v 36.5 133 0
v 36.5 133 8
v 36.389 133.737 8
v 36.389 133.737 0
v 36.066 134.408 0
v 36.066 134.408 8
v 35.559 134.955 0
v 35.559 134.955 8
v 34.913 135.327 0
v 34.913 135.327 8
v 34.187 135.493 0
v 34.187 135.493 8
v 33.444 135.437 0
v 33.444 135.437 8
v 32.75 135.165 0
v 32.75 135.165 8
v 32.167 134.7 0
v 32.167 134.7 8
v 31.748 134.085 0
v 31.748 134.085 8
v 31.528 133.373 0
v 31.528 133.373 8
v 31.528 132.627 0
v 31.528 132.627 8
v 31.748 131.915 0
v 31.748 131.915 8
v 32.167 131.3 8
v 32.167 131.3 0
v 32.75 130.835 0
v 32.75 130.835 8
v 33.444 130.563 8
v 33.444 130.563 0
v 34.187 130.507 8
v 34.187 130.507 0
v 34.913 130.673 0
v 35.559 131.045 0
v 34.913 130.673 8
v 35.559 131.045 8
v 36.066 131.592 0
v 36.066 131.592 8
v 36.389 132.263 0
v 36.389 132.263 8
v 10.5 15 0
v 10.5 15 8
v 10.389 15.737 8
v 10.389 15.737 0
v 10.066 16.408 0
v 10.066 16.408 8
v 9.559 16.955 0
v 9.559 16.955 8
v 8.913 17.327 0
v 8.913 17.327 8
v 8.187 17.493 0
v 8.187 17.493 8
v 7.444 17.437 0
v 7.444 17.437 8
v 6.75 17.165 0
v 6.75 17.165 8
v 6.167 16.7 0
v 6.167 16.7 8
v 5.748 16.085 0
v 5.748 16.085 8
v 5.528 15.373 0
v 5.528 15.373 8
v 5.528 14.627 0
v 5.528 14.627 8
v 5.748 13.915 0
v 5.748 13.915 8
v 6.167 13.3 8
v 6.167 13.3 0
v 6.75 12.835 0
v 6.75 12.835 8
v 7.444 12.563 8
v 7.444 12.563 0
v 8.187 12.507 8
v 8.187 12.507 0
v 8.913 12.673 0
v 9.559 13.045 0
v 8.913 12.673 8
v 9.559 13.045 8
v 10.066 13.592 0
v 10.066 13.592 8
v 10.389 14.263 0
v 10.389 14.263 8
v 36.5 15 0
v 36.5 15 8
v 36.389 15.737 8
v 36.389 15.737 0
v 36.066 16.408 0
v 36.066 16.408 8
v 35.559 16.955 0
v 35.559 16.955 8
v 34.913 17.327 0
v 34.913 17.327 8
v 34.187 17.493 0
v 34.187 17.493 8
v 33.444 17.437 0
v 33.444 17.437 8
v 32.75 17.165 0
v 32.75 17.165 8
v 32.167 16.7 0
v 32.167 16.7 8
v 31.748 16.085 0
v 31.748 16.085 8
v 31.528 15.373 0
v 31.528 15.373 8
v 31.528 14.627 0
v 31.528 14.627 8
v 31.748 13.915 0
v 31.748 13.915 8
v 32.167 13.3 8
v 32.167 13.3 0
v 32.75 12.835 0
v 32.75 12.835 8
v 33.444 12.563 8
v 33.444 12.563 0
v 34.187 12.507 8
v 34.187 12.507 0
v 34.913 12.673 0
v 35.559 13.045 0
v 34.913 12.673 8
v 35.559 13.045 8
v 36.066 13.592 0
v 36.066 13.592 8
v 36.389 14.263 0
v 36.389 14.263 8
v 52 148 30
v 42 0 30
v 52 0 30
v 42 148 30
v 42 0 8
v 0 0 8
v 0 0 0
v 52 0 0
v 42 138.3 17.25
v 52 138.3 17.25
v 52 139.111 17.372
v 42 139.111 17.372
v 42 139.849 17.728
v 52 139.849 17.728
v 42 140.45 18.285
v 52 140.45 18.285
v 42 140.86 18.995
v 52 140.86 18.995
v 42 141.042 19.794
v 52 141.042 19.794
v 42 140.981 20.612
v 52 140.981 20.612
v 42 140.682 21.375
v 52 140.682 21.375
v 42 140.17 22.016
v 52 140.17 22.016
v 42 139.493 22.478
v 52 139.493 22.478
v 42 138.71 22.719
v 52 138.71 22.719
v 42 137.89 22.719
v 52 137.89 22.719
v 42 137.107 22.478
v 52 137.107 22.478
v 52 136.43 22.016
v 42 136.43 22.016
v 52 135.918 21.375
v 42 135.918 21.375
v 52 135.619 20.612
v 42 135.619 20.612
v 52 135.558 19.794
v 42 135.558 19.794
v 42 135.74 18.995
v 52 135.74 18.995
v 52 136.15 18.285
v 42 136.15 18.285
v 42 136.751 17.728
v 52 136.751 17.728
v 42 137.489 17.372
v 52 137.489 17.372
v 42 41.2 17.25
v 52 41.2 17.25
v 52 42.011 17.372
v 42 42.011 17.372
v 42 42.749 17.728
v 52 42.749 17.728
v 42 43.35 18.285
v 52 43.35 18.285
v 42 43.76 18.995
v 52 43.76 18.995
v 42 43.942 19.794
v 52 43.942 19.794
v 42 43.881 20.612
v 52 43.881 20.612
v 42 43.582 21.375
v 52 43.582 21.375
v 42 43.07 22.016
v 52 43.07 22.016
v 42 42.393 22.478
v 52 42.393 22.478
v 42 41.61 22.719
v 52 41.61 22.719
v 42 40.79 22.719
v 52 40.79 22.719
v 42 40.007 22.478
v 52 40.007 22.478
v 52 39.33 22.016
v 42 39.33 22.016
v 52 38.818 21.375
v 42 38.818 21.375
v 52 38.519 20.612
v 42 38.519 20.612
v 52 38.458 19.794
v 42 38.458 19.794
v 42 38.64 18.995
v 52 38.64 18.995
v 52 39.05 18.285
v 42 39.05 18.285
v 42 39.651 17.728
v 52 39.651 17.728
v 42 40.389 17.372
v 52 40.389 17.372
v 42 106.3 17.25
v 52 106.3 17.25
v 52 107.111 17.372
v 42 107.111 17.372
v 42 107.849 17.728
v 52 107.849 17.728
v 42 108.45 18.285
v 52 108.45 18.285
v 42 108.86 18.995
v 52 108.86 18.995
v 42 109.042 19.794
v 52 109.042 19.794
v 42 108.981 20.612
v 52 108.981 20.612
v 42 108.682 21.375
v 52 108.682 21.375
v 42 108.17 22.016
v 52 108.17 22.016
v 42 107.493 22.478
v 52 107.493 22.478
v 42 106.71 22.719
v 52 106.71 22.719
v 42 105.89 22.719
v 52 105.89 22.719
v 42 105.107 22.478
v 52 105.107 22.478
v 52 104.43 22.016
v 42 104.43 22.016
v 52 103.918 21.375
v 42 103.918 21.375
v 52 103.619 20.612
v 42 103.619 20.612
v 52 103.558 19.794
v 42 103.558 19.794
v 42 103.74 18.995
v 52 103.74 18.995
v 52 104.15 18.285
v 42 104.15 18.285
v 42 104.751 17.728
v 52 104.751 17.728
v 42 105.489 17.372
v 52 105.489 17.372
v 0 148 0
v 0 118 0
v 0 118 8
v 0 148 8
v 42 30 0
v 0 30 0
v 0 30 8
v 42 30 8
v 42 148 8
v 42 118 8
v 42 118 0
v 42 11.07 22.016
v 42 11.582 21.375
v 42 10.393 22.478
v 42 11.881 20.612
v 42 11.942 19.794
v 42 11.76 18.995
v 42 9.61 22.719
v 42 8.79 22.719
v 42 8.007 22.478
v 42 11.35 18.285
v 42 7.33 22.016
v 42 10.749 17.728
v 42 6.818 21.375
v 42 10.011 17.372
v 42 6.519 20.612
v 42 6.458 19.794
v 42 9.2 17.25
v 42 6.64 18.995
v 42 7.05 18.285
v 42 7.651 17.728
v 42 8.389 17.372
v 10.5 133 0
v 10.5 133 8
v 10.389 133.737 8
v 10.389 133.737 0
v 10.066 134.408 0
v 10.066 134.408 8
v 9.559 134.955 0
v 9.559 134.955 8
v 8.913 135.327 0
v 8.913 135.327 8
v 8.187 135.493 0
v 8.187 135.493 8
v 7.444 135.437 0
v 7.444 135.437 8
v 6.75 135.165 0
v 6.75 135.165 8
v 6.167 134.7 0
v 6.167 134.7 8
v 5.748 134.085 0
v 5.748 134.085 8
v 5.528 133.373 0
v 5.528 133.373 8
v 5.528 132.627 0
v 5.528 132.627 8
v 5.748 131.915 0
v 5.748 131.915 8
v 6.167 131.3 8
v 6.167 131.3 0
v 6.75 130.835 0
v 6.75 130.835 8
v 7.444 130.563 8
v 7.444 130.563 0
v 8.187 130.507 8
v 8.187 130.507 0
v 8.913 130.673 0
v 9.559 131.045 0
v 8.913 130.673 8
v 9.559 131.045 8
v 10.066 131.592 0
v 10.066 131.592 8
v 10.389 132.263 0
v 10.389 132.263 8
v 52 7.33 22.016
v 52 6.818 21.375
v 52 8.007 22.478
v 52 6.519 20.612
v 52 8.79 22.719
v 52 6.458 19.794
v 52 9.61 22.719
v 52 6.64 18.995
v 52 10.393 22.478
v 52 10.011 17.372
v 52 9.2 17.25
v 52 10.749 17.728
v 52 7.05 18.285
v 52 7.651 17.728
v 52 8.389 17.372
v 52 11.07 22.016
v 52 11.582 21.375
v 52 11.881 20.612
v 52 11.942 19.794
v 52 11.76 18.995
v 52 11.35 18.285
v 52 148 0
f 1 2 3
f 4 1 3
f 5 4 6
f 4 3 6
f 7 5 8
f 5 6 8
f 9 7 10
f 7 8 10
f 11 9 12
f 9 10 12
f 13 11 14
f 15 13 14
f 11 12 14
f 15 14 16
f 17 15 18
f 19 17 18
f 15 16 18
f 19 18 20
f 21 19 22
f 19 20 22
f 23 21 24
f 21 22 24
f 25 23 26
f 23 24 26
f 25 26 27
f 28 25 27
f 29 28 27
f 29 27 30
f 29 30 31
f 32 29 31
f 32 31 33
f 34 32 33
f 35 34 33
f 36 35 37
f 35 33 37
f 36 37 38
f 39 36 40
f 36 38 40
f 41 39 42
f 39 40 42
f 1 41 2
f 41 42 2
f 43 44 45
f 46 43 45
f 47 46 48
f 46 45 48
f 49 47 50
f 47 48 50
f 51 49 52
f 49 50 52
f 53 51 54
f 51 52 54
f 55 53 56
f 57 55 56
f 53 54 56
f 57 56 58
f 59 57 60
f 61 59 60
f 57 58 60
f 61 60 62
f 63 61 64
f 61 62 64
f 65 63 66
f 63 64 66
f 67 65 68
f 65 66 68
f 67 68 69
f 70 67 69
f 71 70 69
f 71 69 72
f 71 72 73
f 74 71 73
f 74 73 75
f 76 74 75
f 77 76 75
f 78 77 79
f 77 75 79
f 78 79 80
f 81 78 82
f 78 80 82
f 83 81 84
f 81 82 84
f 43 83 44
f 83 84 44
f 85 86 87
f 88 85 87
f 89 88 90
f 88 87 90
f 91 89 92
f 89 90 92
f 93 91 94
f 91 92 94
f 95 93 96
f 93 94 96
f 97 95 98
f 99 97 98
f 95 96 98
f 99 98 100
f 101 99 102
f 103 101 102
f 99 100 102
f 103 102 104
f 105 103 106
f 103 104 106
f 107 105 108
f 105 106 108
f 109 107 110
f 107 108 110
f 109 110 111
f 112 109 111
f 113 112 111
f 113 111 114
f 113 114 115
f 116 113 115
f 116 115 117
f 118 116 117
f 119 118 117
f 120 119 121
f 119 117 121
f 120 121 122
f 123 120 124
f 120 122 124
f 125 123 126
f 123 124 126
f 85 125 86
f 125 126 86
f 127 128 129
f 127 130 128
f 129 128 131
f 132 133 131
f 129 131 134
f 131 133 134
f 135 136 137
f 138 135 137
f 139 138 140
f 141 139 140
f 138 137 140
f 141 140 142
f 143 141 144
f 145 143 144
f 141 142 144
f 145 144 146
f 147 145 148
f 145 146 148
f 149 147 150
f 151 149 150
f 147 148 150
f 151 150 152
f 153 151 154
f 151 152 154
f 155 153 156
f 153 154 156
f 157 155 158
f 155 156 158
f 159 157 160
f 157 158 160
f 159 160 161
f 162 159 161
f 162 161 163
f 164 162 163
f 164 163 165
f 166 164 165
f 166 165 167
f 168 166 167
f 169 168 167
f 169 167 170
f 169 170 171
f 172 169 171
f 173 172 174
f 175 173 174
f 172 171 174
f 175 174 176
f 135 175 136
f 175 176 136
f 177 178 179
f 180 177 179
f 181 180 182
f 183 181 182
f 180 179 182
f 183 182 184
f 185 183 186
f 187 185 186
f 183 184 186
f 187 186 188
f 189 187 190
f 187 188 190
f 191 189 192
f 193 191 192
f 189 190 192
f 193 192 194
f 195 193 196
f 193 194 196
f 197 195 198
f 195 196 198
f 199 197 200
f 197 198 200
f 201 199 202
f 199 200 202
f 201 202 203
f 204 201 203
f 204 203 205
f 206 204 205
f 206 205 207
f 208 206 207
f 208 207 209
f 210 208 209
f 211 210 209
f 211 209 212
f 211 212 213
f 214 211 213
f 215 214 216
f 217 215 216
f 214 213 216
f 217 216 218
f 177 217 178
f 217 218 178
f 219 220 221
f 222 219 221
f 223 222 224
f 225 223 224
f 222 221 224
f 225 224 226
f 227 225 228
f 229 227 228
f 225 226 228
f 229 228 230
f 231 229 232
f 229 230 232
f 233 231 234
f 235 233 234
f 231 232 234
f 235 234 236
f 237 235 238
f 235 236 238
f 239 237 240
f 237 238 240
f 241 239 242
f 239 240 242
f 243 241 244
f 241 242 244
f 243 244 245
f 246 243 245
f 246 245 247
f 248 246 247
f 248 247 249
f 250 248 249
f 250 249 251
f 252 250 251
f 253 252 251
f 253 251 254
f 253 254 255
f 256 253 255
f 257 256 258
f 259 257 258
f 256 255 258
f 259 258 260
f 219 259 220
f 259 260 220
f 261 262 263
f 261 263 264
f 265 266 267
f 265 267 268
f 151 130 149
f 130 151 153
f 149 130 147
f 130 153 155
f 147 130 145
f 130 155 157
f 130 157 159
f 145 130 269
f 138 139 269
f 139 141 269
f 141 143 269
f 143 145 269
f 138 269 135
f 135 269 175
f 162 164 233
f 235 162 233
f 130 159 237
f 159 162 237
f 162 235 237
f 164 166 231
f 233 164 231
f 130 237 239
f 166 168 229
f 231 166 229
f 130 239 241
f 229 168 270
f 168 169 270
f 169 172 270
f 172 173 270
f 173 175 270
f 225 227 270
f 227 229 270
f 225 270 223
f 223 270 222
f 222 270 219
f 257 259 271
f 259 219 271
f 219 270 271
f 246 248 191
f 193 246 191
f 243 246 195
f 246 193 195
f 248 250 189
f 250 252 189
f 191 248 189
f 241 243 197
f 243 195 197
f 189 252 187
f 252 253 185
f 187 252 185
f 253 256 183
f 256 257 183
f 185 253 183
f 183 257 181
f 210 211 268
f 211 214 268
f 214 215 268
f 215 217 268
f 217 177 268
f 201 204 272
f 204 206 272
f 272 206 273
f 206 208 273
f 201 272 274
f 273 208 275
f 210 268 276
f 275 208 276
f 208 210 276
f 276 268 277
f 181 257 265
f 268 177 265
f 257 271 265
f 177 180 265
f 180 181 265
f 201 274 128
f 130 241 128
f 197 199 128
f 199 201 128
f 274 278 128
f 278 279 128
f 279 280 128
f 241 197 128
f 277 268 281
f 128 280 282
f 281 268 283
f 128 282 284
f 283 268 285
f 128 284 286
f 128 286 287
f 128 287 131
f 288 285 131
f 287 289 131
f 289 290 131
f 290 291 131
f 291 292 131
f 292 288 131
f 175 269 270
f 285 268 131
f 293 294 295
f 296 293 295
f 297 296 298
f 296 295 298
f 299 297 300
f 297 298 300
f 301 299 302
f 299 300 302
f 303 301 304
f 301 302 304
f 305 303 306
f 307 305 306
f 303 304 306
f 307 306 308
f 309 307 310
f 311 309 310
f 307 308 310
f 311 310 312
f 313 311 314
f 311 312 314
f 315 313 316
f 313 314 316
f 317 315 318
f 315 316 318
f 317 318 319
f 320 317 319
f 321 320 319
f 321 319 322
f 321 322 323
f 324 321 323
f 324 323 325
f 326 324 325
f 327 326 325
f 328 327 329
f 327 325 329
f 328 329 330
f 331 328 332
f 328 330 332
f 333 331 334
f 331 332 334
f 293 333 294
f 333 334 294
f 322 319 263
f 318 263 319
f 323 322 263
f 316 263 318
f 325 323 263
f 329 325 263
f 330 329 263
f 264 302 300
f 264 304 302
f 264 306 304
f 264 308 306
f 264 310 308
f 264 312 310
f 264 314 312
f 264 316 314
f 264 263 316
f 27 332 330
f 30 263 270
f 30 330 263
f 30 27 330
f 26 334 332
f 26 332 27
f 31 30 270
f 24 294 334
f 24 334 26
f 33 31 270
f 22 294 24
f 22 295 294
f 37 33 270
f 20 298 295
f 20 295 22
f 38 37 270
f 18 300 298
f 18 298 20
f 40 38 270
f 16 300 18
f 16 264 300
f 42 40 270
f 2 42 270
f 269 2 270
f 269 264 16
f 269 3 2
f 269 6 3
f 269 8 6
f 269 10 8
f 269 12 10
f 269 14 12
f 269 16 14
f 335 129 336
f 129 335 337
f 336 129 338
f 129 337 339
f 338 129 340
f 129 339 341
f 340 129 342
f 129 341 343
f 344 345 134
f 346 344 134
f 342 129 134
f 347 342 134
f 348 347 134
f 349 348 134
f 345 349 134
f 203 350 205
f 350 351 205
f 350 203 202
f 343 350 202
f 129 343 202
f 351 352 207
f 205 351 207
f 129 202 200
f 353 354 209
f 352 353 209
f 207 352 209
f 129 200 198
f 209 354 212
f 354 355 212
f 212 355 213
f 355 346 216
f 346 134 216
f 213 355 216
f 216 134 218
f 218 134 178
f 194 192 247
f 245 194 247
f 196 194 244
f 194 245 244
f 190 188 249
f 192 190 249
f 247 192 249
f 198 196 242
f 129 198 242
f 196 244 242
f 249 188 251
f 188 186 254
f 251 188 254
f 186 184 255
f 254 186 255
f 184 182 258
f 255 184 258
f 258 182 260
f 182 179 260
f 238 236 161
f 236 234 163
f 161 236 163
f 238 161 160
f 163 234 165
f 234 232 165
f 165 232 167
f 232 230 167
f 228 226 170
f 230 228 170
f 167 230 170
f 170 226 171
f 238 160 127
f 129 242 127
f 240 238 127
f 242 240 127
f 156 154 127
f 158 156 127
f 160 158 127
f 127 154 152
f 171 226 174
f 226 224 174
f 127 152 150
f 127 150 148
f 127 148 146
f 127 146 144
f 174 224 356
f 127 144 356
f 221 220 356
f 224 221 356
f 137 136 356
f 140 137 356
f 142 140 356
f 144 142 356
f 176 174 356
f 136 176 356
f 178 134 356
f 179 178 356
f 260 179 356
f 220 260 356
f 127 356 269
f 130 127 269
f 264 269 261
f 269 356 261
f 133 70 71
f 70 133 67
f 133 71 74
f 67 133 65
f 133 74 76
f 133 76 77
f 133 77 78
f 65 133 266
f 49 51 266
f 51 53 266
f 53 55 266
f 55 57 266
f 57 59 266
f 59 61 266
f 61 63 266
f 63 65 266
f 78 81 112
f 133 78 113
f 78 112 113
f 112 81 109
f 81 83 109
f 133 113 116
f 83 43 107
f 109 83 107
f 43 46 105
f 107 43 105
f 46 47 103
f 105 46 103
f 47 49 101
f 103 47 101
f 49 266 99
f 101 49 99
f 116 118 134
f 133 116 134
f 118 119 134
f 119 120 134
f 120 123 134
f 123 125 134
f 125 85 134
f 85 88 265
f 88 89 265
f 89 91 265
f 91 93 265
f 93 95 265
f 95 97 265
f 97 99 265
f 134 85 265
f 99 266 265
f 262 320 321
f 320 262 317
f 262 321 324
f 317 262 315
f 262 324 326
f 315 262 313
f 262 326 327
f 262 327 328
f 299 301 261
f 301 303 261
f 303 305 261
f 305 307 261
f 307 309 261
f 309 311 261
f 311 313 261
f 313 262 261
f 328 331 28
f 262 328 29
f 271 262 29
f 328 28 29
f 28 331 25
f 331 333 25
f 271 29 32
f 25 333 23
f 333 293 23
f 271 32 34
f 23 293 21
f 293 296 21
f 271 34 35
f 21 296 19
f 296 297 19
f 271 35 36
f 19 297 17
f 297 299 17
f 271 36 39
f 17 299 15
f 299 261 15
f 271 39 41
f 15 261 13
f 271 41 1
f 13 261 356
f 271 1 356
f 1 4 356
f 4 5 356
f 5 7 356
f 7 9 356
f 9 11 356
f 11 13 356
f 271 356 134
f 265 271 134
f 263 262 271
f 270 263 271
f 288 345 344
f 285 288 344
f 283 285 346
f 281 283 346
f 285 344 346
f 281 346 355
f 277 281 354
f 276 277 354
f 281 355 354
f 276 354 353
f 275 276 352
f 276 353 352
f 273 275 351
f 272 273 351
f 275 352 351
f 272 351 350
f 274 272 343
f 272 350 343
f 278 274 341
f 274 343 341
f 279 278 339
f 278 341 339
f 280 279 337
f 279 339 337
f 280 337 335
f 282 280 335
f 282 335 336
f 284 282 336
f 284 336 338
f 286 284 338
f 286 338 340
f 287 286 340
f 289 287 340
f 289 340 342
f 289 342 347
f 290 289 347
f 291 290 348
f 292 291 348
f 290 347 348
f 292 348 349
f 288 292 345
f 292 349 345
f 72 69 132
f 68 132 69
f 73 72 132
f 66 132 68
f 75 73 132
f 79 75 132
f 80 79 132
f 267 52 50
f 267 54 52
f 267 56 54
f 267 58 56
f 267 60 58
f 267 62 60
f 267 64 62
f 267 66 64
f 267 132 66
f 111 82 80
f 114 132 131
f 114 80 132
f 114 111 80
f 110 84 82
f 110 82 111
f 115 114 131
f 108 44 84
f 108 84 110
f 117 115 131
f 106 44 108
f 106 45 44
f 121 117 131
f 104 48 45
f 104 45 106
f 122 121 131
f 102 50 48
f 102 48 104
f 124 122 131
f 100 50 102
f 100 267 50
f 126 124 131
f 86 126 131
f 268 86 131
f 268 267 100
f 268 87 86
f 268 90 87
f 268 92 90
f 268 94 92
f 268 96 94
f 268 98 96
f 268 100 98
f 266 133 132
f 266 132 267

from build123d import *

# Parameters (mm, degrees)
SKETCH1_W             = 42
SKETCH1_H             = 30
BOSS_EXTRUDE1_DEPTH   = 8
BOSS_EXTRUDE1_2_DEPTH = 8
BOSS_EXTRUDE2_DEPTH   = 30
SKETCH2_R             = 2.5
CUT_EXTRUDE1_DEPTH    = 8
SKETCH3_R             = 2.75
CUT_EXTRUDE2_DEPTH    = 10


with BuildPart() as part:
    # Sketch1 → Boss-Extrude1 (new body)
    with BuildSketch(Plane.XY):
        with Locations((21, 133)):
            Rectangle(SKETCH1_W, SKETCH1_H)
    extrude(amount=BOSS_EXTRUDE1_DEPTH)



with BuildPart() as body_2:
    # Sketch1 → Boss-Extrude1 2 (new body)
    with BuildSketch(Plane.XY):
        with Locations((21, 15)):
            Rectangle(SKETCH1_W, SKETCH1_H)
    extrude(amount=BOSS_EXTRUDE1_2_DEPTH)


with BuildPart() as part_1:
    add(part.part)

    add(body_2.part)  # Boss-Extrude2 merges body 2
    # Sketch1_3 → Boss-Extrude2 (add)
    with BuildSketch(Plane.XY):
        Polygon((42, 30), (42, 0), (52, 0), (52, 148), (42, 148), (42, 118), align=None)
    extrude(amount=BOSS_EXTRUDE2_DEPTH)

    # Sketch2 → Cut-Extrude1 (cut)
    with BuildSketch(Plane.XY.offset(8)):
        with Locations((8, 133)):
            Circle(SKETCH2_R)
        with Locations((34, 133)):
            Circle(SKETCH2_R)
        with Locations((34, 15)):
            Circle(SKETCH2_R)
        with Locations((8, 15)):
            Circle(SKETCH2_R)
    extrude(amount=-CUT_EXTRUDE1_DEPTH, mode=Mode.SUBTRACT)

    # Sketch3 → Cut-Extrude2 (cut)
    with BuildSketch(Plane(origin=(52, 0, 0), x_dir=(0, 0, -1), z_dir=(1, 0, 0))):
        with Locations((-20, 138.3)):
            Circle(SKETCH3_R)
        with Locations((-20, 106.3)):
            Circle(SKETCH3_R)
        with Locations((-20, 41.2)):
            Circle(SKETCH3_R)
        with Locations((-20, 9.2)):
            Circle(SKETCH3_R)
    extrude(amount=-CUT_EXTRUDE2_DEPTH, mode=Mode.SUBTRACT)


solid = part_1.part
